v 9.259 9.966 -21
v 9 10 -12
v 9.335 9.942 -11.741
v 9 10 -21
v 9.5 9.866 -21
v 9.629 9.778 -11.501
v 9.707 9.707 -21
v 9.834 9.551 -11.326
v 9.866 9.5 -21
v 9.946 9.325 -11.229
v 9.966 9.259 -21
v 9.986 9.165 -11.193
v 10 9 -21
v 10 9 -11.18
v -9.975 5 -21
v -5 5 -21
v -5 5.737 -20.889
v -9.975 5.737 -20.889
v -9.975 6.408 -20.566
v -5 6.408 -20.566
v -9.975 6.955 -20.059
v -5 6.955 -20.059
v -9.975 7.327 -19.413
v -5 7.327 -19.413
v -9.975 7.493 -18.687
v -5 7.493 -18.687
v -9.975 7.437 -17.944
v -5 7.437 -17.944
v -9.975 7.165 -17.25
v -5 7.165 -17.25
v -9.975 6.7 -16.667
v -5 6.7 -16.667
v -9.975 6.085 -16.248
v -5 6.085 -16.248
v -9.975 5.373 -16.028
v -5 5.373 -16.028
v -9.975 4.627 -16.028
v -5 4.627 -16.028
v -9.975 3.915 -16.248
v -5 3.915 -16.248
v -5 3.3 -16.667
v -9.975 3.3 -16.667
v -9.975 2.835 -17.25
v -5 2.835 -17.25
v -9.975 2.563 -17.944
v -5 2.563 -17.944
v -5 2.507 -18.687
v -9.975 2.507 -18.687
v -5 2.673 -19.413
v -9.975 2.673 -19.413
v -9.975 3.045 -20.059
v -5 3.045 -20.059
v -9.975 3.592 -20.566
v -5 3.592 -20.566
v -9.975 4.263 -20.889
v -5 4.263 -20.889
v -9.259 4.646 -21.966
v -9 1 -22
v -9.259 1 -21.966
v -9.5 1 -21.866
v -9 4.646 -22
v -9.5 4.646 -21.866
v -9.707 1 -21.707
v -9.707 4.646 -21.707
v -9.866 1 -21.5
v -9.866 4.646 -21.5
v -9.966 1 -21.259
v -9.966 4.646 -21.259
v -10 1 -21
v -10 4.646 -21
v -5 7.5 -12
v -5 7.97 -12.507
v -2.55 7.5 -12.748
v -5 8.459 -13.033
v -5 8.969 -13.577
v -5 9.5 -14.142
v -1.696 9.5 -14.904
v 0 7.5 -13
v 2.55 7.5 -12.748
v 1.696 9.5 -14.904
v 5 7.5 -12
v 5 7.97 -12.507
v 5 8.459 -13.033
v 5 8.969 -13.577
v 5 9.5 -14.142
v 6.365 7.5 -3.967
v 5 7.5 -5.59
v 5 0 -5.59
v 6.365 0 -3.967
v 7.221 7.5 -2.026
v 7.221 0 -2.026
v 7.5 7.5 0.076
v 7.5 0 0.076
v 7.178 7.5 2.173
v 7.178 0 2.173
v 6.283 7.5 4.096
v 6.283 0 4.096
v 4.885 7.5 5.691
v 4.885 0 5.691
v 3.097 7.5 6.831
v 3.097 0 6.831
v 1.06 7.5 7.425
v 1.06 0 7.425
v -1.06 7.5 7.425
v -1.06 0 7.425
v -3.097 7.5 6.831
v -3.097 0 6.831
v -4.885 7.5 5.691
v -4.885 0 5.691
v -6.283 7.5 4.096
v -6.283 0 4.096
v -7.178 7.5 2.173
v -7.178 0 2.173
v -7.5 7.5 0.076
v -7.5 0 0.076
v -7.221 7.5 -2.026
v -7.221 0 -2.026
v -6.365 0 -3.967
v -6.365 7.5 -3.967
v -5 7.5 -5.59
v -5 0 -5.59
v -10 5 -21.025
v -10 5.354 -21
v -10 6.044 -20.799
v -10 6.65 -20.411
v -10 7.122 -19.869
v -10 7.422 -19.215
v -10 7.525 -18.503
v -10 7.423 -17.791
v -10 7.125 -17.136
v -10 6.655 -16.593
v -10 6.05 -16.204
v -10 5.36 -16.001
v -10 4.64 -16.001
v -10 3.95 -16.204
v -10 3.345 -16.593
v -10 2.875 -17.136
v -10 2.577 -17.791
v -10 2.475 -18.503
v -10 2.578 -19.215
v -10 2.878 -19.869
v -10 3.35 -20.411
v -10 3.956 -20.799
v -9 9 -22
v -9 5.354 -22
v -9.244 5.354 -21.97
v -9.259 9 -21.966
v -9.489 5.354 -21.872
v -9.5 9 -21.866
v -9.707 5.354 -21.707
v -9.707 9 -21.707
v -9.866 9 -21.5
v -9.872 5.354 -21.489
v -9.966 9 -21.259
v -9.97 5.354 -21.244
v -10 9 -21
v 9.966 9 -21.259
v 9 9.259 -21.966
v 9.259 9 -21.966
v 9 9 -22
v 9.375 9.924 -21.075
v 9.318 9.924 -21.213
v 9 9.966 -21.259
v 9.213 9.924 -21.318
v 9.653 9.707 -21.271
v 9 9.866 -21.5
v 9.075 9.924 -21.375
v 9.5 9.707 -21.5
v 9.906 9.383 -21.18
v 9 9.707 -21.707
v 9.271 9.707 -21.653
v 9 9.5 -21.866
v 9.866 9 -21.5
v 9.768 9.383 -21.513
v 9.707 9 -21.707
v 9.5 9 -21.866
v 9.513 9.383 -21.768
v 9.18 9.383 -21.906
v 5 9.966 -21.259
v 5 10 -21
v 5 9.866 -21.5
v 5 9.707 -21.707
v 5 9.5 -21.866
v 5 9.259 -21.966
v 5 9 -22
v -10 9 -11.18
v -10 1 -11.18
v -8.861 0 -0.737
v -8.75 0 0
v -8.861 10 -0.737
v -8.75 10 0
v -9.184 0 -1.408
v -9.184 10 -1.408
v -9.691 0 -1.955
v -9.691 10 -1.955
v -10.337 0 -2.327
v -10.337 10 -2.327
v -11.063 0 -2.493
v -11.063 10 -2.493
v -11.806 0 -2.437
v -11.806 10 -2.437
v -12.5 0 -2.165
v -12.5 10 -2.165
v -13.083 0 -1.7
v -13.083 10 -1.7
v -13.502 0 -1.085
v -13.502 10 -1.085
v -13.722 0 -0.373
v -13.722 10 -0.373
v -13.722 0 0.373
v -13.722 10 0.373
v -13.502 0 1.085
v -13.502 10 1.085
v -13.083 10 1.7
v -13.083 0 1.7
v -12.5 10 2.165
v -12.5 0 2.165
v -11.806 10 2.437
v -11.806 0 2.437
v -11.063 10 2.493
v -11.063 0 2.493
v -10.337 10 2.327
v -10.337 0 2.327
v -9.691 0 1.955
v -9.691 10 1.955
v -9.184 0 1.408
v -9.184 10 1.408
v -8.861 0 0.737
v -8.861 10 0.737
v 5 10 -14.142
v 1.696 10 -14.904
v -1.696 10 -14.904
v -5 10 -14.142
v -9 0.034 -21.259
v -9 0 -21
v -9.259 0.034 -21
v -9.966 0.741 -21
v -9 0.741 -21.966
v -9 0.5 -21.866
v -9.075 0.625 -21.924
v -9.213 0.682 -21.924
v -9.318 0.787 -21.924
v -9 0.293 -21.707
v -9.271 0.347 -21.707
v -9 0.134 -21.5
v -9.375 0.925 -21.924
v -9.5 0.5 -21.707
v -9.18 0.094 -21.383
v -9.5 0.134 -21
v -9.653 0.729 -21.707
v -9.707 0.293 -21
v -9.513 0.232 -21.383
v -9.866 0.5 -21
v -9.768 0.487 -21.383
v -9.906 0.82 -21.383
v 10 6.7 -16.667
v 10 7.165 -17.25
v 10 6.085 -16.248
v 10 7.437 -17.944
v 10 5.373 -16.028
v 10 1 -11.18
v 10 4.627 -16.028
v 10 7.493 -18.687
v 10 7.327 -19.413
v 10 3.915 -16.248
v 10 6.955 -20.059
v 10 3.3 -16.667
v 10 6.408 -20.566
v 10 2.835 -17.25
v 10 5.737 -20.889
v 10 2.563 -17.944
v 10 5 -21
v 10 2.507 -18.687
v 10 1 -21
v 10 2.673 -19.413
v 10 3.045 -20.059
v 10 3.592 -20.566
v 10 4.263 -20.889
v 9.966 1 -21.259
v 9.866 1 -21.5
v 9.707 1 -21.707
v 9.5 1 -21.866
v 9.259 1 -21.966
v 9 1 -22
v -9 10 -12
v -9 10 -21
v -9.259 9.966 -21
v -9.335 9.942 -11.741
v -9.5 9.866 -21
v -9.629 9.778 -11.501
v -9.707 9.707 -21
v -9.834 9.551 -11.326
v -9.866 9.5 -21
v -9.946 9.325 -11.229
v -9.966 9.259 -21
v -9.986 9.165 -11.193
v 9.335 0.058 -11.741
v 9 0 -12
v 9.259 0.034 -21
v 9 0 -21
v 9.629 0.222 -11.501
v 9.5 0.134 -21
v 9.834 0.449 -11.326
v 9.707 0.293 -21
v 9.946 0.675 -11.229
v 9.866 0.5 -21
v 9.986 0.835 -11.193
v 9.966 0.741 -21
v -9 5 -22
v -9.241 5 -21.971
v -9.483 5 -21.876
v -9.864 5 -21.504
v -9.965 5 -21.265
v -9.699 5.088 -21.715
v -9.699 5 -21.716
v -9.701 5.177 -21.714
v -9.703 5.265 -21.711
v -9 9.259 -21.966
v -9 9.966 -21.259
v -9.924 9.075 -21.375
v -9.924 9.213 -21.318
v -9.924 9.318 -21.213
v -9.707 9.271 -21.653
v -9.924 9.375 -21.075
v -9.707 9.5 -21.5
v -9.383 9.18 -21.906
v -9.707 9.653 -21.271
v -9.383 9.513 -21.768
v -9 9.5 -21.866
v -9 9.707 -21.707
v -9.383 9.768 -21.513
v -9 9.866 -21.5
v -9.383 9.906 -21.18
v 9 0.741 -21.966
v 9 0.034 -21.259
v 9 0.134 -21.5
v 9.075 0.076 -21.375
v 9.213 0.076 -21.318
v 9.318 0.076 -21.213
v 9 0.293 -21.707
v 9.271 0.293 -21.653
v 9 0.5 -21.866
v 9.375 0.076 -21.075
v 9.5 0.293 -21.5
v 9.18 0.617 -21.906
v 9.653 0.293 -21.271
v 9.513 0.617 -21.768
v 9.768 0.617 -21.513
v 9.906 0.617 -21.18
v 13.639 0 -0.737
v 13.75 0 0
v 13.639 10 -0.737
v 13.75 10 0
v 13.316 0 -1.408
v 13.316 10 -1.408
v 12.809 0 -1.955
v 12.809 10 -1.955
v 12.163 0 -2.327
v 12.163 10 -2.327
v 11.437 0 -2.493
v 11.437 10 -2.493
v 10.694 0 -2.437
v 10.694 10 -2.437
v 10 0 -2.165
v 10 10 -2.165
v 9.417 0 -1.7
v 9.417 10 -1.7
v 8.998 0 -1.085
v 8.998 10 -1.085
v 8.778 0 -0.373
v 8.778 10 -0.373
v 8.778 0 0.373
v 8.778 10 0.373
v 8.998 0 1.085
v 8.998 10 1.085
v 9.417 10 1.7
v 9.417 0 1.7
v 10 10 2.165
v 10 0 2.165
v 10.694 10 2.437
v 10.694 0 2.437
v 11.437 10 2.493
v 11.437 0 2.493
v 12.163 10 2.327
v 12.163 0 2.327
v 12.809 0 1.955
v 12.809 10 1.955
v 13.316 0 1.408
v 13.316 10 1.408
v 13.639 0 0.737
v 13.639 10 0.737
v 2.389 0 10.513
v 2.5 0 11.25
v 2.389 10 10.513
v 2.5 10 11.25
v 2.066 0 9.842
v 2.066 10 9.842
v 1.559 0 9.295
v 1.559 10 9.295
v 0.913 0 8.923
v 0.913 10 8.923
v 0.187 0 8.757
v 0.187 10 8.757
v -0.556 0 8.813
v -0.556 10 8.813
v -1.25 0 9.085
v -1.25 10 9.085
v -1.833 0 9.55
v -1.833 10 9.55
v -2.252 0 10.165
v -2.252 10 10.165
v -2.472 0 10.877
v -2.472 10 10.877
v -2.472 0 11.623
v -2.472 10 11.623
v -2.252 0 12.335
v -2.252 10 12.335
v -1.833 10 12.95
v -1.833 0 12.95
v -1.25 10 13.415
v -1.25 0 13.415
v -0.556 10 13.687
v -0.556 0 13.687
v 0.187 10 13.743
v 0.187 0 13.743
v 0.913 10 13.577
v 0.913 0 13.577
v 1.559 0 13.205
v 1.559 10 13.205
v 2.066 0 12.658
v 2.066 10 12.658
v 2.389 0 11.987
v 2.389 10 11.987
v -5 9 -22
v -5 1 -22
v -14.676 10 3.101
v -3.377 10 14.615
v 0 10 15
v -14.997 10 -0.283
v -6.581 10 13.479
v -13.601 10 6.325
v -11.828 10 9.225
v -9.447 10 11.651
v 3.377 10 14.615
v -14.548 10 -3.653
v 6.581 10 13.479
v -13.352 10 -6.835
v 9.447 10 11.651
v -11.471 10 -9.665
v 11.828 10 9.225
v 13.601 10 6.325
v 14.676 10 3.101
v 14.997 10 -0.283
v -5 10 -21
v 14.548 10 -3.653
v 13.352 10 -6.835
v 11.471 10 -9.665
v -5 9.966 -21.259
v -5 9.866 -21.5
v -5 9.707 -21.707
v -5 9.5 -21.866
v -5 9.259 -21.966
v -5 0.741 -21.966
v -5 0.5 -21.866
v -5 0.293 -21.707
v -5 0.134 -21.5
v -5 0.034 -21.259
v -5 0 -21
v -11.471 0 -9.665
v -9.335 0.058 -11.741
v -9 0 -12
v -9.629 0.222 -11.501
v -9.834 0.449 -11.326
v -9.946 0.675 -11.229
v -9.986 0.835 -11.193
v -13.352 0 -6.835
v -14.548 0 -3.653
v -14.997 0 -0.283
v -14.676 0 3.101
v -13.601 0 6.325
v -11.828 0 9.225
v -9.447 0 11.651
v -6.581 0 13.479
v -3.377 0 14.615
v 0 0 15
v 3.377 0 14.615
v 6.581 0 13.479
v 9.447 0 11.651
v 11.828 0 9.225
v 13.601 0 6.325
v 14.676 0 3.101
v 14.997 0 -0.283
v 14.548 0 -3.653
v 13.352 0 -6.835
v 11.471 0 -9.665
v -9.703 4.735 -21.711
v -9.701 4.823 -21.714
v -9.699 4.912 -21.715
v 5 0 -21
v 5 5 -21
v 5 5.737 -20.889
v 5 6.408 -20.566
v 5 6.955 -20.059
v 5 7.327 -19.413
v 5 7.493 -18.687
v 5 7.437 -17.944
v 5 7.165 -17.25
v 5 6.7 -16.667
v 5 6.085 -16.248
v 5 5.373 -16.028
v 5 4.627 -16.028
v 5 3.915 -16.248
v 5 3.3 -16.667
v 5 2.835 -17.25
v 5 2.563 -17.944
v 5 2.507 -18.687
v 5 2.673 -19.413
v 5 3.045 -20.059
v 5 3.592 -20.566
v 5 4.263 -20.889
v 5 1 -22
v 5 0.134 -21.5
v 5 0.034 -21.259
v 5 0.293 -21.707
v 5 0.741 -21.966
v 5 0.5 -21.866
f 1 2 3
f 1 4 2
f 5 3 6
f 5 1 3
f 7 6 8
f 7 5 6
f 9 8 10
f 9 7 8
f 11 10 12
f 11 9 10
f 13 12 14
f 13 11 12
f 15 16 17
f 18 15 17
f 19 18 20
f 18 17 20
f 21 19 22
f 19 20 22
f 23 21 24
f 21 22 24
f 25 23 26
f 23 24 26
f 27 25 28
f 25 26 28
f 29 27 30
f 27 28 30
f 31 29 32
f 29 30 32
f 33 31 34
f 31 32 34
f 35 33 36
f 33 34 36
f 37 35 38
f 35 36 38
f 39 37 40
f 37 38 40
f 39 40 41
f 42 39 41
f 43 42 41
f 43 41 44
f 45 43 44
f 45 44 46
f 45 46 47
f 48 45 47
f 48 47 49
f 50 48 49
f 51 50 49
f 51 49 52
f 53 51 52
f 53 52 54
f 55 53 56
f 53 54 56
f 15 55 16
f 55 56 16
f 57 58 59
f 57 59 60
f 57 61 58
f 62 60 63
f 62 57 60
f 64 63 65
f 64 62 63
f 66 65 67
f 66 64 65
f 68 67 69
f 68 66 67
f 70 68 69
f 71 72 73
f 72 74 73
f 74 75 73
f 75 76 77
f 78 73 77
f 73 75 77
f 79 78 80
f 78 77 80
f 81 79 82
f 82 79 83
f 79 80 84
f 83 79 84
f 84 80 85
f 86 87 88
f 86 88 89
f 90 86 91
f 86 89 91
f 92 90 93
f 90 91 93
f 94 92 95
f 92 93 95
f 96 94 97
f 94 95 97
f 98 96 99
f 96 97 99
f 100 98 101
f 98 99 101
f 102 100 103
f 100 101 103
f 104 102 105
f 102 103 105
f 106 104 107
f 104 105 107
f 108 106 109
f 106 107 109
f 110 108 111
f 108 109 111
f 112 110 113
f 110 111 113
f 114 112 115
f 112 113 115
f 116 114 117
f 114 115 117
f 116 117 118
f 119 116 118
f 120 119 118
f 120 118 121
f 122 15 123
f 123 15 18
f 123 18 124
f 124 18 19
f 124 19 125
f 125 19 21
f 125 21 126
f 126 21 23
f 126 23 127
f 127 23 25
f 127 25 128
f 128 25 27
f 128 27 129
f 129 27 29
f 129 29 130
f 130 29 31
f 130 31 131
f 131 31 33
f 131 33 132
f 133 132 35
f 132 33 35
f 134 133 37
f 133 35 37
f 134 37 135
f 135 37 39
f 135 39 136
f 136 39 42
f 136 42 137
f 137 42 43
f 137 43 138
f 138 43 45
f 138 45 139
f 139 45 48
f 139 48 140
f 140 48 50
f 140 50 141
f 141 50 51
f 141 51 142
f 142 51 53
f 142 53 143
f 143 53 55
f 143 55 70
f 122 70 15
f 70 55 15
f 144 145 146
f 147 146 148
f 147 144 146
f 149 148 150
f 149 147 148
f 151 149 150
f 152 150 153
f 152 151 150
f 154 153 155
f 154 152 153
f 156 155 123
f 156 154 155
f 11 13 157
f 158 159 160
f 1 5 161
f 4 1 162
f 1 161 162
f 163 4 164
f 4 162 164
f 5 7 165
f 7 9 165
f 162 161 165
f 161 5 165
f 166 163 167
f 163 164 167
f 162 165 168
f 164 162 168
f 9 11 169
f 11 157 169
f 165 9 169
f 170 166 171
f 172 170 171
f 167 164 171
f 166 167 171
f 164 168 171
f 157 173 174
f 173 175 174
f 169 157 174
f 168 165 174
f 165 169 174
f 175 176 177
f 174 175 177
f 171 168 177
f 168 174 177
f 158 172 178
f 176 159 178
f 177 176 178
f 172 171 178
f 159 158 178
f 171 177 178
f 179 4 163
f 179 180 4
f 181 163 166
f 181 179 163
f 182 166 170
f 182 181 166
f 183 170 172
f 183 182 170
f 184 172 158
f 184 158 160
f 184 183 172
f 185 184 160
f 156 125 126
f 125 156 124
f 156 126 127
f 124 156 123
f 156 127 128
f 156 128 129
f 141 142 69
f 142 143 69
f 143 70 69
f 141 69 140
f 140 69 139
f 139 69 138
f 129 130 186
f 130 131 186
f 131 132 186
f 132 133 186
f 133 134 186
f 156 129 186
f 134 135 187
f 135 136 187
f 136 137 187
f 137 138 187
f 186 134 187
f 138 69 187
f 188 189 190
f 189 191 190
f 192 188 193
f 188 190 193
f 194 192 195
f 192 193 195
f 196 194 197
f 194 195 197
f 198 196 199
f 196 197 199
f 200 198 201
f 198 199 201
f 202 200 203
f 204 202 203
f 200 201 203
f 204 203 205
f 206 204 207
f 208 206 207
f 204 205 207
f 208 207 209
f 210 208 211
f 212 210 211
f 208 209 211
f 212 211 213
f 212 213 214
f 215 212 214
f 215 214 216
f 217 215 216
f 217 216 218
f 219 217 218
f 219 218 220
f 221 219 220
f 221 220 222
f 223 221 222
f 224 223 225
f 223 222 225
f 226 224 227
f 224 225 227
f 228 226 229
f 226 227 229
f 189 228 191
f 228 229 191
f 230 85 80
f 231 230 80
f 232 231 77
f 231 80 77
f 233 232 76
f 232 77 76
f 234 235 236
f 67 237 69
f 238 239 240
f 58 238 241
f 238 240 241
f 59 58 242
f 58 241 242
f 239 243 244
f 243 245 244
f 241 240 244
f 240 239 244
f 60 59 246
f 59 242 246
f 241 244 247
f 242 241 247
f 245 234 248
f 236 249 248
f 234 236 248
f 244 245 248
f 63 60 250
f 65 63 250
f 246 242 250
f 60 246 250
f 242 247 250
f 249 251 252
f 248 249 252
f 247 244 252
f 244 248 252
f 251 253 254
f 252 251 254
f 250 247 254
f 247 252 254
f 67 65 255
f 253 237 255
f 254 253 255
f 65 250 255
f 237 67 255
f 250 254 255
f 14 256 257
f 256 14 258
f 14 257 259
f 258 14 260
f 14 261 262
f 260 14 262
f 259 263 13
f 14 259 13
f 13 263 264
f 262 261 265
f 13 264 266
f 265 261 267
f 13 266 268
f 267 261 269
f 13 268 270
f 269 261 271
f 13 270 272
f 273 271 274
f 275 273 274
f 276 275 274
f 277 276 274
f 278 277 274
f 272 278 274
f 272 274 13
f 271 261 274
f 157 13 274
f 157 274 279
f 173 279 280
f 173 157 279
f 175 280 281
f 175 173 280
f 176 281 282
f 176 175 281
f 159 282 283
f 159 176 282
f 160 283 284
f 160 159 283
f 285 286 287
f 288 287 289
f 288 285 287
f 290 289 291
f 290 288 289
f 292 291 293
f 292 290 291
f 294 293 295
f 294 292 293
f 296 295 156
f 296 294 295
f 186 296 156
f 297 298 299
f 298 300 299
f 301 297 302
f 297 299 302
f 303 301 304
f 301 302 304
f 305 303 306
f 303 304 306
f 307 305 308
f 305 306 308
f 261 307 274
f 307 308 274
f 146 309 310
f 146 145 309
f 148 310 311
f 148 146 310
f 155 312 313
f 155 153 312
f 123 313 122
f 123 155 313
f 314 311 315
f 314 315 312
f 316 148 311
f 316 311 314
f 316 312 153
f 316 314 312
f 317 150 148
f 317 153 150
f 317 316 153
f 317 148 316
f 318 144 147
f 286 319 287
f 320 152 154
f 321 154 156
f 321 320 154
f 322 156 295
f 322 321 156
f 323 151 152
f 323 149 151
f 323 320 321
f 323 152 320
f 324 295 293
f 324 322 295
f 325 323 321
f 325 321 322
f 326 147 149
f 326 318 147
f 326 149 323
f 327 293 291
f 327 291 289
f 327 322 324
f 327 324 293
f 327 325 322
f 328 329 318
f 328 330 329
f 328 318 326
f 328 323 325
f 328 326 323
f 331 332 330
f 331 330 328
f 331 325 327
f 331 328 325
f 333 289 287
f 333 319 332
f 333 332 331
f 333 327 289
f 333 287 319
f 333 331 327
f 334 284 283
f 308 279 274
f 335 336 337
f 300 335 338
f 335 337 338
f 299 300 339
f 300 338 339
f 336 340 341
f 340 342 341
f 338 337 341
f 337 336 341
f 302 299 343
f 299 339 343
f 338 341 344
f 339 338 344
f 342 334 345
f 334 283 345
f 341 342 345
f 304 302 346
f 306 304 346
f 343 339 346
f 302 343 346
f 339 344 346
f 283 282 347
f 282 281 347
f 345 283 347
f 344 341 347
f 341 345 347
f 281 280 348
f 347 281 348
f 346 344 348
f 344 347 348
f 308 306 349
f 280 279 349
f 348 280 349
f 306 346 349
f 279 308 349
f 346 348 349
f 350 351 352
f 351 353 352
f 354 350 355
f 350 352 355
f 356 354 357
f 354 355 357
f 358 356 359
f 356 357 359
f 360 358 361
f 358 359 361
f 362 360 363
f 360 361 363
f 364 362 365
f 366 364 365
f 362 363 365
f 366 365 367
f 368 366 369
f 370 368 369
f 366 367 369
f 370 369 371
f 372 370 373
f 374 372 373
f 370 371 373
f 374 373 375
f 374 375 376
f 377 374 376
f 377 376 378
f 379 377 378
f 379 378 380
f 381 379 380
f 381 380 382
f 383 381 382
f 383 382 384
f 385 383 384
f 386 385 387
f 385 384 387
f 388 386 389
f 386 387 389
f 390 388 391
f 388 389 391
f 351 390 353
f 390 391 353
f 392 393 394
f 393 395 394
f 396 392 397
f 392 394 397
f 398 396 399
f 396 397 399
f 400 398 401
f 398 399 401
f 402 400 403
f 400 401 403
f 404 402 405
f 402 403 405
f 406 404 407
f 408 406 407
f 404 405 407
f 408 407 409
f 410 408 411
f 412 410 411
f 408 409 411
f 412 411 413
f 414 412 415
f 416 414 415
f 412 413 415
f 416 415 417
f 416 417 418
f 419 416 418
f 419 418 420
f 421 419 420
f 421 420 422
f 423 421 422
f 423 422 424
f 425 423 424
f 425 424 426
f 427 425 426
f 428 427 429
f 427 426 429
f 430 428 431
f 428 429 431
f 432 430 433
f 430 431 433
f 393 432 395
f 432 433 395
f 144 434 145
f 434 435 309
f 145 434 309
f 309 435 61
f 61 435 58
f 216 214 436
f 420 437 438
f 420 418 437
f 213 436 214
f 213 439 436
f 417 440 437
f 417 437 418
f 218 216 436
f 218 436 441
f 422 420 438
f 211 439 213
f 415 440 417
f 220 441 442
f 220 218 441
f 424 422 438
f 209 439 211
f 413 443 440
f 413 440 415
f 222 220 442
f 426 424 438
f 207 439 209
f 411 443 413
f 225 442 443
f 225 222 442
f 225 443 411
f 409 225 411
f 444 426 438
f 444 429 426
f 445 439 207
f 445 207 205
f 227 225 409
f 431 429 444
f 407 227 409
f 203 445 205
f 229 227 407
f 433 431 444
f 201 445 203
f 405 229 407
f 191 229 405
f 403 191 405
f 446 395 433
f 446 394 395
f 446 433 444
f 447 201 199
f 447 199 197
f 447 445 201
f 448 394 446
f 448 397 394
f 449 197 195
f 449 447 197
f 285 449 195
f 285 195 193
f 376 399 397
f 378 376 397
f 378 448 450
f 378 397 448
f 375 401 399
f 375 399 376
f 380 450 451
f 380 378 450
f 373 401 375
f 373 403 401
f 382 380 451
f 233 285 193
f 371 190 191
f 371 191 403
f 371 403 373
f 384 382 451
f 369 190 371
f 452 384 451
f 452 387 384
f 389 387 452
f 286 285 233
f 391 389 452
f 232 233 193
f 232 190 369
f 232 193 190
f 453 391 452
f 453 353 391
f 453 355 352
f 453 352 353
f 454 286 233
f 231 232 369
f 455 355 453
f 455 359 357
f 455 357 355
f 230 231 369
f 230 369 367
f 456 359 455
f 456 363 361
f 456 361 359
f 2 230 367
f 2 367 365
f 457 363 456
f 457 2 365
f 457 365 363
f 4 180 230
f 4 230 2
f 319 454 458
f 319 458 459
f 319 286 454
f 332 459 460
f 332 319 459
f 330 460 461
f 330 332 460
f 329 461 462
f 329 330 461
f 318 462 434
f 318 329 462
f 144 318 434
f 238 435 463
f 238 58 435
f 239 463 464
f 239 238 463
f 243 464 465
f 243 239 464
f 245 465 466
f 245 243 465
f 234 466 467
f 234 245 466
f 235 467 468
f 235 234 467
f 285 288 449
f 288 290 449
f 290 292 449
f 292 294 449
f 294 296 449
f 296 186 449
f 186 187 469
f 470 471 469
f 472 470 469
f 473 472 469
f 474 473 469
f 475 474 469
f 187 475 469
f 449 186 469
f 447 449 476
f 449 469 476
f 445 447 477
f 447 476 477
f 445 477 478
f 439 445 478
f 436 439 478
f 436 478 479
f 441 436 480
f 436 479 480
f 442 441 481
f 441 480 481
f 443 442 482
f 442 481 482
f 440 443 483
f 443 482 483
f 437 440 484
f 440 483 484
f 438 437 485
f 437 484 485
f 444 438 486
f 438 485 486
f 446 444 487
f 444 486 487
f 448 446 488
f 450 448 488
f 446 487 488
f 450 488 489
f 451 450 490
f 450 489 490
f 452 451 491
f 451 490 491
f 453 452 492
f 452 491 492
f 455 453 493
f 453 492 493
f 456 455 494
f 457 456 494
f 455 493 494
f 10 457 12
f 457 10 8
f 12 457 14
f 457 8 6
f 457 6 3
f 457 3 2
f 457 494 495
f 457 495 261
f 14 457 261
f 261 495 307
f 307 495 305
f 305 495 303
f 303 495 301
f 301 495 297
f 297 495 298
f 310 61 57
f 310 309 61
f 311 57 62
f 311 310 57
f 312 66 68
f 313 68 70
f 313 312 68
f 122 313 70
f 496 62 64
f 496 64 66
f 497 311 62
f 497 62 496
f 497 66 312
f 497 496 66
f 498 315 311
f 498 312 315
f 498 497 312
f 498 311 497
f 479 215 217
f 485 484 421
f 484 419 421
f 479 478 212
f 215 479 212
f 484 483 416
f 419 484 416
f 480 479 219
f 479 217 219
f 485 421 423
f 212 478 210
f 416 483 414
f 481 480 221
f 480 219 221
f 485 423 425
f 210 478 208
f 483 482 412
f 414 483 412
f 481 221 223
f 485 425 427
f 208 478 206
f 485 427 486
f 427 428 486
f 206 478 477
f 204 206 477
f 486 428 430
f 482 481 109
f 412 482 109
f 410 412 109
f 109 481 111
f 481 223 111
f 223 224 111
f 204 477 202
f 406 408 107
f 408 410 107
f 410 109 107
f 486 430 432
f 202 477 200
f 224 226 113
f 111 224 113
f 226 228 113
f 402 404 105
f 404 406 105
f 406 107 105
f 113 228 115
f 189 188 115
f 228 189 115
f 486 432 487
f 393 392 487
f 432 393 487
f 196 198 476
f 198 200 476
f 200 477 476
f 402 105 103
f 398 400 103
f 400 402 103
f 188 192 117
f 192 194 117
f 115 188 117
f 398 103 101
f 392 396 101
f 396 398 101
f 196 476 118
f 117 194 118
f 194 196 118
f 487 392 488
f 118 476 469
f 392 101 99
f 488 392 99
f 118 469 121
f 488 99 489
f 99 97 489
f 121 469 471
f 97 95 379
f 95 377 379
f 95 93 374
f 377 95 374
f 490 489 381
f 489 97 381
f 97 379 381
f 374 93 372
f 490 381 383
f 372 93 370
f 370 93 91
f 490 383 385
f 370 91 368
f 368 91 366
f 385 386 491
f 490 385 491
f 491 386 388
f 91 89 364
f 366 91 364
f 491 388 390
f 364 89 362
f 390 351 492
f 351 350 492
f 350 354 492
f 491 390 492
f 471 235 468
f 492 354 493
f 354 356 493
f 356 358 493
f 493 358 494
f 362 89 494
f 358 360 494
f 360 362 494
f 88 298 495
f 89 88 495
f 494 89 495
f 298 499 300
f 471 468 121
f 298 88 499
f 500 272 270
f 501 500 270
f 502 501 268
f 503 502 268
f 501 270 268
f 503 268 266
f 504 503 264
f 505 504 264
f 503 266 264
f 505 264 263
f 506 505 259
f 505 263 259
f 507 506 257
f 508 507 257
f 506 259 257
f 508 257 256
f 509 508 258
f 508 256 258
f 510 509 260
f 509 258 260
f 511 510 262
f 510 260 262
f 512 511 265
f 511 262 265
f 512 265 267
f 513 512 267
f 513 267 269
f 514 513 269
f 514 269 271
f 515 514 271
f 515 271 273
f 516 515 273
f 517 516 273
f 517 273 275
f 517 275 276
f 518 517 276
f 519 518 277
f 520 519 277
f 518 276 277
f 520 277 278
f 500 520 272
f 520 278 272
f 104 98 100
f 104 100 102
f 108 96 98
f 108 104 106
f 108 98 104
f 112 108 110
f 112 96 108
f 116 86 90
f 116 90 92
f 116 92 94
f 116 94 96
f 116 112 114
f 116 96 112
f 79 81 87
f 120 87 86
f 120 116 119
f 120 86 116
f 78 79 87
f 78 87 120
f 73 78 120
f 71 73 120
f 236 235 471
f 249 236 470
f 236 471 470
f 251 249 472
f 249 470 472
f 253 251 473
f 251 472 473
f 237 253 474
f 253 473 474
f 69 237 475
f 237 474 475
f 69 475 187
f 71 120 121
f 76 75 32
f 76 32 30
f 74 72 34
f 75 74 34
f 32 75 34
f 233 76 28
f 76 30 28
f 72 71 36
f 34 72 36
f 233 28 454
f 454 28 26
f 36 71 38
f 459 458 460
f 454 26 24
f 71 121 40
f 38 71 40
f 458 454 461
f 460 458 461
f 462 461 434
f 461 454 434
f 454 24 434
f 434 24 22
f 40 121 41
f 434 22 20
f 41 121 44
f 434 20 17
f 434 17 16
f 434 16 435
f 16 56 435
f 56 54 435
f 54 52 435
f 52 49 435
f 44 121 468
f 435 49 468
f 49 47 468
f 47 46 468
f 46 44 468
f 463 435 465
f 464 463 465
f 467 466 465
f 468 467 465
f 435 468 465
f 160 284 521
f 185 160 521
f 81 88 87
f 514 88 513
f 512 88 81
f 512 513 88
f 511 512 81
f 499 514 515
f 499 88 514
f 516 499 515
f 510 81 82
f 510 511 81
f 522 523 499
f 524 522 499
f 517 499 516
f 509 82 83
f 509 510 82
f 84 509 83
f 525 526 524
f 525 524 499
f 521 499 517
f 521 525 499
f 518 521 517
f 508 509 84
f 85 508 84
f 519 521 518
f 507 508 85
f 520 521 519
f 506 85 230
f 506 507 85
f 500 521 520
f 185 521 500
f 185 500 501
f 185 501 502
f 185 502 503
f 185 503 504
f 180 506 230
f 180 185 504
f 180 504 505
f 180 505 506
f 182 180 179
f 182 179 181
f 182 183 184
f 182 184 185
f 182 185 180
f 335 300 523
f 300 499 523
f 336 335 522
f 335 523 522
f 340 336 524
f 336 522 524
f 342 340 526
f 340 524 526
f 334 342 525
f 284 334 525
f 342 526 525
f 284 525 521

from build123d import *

# Parameters (mm, degrees)
BOSS_EXTRUDE1_DEPTH             = 10
F_5_0MM_DOWEL_HOLE1_D           = 5
F_5_0MM_DOWEL_HOLE1_CSINK_D     = 5.05
F_5_0MM_DOWEL_HOLE1_CSINK_ANGLE = 90
SKETCH5_W                       = 10
SKETCH5_H                       = 7.5
CUT_EXTRUDE1_DEPTH              = 20
SKETCH6_R                       = 7.5
CUT_EXTRUDE2_DEPTH              = 7.5
CHAMFER1_SIZE                   = 2
FILLET1_R                       = 1
F_5_0MM_DOWEL_HOLE2_D           = 5
F_5_0MM_DOWEL_HOLE2_DEPTH       = 10
F_5_0MM_DOWEL_HOLE2_TIP         = 1.502151548


with BuildPart() as part:
    # Sketch1 → Boss-Extrude1 (new body)
    with BuildSketch(Plane(origin=(0, 0, 0), x_dir=(1, 0, 0), z_dir=(0, 1, 0))):
        with BuildLine():
            Line((-5, 14.142135624), (-5, 22))
            Line((-5, 22), (-10, 22))
            Line((-10, 22), (-10, 11.180339887))
            ThreePointArc((-10, 11.180339887), (0, -15), (10, 11.180339887))
            Line((10, 11.180339887), (10, 22))
            Line((10, 22), (5, 22))
            Line((5, 22), (5, 14.142135624))
            ThreePointArc((5, 14.142135624), (0, 15), (-5, 14.142135624))
        make_face()
    extrude(amount=BOSS_EXTRUDE1_DEPTH)

    # Ø5.0mm Dowel Hole1 (through all)
    with Locations(Plane.ZY.offset(10)):
        with Locations((-18.5, 5)):
            CounterSinkHole(F_5_0MM_DOWEL_HOLE1_D / 2, F_5_0MM_DOWEL_HOLE1_CSINK_D / 2, counter_sink_angle=F_5_0MM_DOWEL_HOLE1_CSINK_ANGLE)

    # Sketch5 → Cut-Extrude1 (cut)
    with BuildSketch(Plane(origin=(0, 0, -22), x_dir=(-1, 0, 0), z_dir=(0, 0, -1))):
        with Locations((0, 3.75)):
            Rectangle(SKETCH5_W, SKETCH5_H)
    extrude(amount=-CUT_EXTRUDE1_DEPTH, mode=Mode.SUBTRACT)

    # Sketch6 → Cut-Extrude2 (cut)
    with BuildSketch(Plane.XZ):
        Circle(SKETCH6_R)
    extrude(amount=-CUT_EXTRUDE2_DEPTH, mode=Mode.SUBTRACT)

    # Chamfer1
    chamfer1_edges = [part.edges().sort_by_distance(p)[0] for p in [
        (0, 7.5, -15),
    ]]
    chamfer(chamfer1_edges, length=CHAMFER1_SIZE)

    # Fillet1
    fillet1_edges = [part.edges().sort_by_distance(p)[0] for p in [
        (-10, 0, -16.590169944),
        (-7.5, 0, -22),
        (-7.5, 10, -22),
        (10, 5, -22),
        (-10, 5, -22),
        (-10, 10, -16.590169944),
        (10, 10, -16.590169944),
        (7.5, 10, -22),
        (7.5, 0, -22),
        (10, 0, -16.590169944),
    ]]
    fillet(fillet1_edges, radius=FILLET1_R - 0.0001)  # a hair under: the kernel refuses the full size

    # Ø5.0mm Dowel Hole2
    with Locations(Plane(origin=(0, 0, 0), x_dir=(-1, 0, 0), z_dir=(0, -1, 0))):
        with Locations((-11.25, 0), (0, -11.25), (11.25, 0)):
            Hole(F_5_0MM_DOWEL_HOLE2_D / 2, depth=F_5_0MM_DOWEL_HOLE2_DEPTH)
            with Locations((0, 0, -(F_5_0MM_DOWEL_HOLE2_DEPTH + F_5_0MM_DOWEL_HOLE2_TIP / 2))):  # 118° drill point
                Cone(0, F_5_0MM_DOWEL_HOLE2_D / 2, F_5_0MM_DOWEL_HOLE2_TIP, mode=Mode.SUBTRACT)


solid = part.part
